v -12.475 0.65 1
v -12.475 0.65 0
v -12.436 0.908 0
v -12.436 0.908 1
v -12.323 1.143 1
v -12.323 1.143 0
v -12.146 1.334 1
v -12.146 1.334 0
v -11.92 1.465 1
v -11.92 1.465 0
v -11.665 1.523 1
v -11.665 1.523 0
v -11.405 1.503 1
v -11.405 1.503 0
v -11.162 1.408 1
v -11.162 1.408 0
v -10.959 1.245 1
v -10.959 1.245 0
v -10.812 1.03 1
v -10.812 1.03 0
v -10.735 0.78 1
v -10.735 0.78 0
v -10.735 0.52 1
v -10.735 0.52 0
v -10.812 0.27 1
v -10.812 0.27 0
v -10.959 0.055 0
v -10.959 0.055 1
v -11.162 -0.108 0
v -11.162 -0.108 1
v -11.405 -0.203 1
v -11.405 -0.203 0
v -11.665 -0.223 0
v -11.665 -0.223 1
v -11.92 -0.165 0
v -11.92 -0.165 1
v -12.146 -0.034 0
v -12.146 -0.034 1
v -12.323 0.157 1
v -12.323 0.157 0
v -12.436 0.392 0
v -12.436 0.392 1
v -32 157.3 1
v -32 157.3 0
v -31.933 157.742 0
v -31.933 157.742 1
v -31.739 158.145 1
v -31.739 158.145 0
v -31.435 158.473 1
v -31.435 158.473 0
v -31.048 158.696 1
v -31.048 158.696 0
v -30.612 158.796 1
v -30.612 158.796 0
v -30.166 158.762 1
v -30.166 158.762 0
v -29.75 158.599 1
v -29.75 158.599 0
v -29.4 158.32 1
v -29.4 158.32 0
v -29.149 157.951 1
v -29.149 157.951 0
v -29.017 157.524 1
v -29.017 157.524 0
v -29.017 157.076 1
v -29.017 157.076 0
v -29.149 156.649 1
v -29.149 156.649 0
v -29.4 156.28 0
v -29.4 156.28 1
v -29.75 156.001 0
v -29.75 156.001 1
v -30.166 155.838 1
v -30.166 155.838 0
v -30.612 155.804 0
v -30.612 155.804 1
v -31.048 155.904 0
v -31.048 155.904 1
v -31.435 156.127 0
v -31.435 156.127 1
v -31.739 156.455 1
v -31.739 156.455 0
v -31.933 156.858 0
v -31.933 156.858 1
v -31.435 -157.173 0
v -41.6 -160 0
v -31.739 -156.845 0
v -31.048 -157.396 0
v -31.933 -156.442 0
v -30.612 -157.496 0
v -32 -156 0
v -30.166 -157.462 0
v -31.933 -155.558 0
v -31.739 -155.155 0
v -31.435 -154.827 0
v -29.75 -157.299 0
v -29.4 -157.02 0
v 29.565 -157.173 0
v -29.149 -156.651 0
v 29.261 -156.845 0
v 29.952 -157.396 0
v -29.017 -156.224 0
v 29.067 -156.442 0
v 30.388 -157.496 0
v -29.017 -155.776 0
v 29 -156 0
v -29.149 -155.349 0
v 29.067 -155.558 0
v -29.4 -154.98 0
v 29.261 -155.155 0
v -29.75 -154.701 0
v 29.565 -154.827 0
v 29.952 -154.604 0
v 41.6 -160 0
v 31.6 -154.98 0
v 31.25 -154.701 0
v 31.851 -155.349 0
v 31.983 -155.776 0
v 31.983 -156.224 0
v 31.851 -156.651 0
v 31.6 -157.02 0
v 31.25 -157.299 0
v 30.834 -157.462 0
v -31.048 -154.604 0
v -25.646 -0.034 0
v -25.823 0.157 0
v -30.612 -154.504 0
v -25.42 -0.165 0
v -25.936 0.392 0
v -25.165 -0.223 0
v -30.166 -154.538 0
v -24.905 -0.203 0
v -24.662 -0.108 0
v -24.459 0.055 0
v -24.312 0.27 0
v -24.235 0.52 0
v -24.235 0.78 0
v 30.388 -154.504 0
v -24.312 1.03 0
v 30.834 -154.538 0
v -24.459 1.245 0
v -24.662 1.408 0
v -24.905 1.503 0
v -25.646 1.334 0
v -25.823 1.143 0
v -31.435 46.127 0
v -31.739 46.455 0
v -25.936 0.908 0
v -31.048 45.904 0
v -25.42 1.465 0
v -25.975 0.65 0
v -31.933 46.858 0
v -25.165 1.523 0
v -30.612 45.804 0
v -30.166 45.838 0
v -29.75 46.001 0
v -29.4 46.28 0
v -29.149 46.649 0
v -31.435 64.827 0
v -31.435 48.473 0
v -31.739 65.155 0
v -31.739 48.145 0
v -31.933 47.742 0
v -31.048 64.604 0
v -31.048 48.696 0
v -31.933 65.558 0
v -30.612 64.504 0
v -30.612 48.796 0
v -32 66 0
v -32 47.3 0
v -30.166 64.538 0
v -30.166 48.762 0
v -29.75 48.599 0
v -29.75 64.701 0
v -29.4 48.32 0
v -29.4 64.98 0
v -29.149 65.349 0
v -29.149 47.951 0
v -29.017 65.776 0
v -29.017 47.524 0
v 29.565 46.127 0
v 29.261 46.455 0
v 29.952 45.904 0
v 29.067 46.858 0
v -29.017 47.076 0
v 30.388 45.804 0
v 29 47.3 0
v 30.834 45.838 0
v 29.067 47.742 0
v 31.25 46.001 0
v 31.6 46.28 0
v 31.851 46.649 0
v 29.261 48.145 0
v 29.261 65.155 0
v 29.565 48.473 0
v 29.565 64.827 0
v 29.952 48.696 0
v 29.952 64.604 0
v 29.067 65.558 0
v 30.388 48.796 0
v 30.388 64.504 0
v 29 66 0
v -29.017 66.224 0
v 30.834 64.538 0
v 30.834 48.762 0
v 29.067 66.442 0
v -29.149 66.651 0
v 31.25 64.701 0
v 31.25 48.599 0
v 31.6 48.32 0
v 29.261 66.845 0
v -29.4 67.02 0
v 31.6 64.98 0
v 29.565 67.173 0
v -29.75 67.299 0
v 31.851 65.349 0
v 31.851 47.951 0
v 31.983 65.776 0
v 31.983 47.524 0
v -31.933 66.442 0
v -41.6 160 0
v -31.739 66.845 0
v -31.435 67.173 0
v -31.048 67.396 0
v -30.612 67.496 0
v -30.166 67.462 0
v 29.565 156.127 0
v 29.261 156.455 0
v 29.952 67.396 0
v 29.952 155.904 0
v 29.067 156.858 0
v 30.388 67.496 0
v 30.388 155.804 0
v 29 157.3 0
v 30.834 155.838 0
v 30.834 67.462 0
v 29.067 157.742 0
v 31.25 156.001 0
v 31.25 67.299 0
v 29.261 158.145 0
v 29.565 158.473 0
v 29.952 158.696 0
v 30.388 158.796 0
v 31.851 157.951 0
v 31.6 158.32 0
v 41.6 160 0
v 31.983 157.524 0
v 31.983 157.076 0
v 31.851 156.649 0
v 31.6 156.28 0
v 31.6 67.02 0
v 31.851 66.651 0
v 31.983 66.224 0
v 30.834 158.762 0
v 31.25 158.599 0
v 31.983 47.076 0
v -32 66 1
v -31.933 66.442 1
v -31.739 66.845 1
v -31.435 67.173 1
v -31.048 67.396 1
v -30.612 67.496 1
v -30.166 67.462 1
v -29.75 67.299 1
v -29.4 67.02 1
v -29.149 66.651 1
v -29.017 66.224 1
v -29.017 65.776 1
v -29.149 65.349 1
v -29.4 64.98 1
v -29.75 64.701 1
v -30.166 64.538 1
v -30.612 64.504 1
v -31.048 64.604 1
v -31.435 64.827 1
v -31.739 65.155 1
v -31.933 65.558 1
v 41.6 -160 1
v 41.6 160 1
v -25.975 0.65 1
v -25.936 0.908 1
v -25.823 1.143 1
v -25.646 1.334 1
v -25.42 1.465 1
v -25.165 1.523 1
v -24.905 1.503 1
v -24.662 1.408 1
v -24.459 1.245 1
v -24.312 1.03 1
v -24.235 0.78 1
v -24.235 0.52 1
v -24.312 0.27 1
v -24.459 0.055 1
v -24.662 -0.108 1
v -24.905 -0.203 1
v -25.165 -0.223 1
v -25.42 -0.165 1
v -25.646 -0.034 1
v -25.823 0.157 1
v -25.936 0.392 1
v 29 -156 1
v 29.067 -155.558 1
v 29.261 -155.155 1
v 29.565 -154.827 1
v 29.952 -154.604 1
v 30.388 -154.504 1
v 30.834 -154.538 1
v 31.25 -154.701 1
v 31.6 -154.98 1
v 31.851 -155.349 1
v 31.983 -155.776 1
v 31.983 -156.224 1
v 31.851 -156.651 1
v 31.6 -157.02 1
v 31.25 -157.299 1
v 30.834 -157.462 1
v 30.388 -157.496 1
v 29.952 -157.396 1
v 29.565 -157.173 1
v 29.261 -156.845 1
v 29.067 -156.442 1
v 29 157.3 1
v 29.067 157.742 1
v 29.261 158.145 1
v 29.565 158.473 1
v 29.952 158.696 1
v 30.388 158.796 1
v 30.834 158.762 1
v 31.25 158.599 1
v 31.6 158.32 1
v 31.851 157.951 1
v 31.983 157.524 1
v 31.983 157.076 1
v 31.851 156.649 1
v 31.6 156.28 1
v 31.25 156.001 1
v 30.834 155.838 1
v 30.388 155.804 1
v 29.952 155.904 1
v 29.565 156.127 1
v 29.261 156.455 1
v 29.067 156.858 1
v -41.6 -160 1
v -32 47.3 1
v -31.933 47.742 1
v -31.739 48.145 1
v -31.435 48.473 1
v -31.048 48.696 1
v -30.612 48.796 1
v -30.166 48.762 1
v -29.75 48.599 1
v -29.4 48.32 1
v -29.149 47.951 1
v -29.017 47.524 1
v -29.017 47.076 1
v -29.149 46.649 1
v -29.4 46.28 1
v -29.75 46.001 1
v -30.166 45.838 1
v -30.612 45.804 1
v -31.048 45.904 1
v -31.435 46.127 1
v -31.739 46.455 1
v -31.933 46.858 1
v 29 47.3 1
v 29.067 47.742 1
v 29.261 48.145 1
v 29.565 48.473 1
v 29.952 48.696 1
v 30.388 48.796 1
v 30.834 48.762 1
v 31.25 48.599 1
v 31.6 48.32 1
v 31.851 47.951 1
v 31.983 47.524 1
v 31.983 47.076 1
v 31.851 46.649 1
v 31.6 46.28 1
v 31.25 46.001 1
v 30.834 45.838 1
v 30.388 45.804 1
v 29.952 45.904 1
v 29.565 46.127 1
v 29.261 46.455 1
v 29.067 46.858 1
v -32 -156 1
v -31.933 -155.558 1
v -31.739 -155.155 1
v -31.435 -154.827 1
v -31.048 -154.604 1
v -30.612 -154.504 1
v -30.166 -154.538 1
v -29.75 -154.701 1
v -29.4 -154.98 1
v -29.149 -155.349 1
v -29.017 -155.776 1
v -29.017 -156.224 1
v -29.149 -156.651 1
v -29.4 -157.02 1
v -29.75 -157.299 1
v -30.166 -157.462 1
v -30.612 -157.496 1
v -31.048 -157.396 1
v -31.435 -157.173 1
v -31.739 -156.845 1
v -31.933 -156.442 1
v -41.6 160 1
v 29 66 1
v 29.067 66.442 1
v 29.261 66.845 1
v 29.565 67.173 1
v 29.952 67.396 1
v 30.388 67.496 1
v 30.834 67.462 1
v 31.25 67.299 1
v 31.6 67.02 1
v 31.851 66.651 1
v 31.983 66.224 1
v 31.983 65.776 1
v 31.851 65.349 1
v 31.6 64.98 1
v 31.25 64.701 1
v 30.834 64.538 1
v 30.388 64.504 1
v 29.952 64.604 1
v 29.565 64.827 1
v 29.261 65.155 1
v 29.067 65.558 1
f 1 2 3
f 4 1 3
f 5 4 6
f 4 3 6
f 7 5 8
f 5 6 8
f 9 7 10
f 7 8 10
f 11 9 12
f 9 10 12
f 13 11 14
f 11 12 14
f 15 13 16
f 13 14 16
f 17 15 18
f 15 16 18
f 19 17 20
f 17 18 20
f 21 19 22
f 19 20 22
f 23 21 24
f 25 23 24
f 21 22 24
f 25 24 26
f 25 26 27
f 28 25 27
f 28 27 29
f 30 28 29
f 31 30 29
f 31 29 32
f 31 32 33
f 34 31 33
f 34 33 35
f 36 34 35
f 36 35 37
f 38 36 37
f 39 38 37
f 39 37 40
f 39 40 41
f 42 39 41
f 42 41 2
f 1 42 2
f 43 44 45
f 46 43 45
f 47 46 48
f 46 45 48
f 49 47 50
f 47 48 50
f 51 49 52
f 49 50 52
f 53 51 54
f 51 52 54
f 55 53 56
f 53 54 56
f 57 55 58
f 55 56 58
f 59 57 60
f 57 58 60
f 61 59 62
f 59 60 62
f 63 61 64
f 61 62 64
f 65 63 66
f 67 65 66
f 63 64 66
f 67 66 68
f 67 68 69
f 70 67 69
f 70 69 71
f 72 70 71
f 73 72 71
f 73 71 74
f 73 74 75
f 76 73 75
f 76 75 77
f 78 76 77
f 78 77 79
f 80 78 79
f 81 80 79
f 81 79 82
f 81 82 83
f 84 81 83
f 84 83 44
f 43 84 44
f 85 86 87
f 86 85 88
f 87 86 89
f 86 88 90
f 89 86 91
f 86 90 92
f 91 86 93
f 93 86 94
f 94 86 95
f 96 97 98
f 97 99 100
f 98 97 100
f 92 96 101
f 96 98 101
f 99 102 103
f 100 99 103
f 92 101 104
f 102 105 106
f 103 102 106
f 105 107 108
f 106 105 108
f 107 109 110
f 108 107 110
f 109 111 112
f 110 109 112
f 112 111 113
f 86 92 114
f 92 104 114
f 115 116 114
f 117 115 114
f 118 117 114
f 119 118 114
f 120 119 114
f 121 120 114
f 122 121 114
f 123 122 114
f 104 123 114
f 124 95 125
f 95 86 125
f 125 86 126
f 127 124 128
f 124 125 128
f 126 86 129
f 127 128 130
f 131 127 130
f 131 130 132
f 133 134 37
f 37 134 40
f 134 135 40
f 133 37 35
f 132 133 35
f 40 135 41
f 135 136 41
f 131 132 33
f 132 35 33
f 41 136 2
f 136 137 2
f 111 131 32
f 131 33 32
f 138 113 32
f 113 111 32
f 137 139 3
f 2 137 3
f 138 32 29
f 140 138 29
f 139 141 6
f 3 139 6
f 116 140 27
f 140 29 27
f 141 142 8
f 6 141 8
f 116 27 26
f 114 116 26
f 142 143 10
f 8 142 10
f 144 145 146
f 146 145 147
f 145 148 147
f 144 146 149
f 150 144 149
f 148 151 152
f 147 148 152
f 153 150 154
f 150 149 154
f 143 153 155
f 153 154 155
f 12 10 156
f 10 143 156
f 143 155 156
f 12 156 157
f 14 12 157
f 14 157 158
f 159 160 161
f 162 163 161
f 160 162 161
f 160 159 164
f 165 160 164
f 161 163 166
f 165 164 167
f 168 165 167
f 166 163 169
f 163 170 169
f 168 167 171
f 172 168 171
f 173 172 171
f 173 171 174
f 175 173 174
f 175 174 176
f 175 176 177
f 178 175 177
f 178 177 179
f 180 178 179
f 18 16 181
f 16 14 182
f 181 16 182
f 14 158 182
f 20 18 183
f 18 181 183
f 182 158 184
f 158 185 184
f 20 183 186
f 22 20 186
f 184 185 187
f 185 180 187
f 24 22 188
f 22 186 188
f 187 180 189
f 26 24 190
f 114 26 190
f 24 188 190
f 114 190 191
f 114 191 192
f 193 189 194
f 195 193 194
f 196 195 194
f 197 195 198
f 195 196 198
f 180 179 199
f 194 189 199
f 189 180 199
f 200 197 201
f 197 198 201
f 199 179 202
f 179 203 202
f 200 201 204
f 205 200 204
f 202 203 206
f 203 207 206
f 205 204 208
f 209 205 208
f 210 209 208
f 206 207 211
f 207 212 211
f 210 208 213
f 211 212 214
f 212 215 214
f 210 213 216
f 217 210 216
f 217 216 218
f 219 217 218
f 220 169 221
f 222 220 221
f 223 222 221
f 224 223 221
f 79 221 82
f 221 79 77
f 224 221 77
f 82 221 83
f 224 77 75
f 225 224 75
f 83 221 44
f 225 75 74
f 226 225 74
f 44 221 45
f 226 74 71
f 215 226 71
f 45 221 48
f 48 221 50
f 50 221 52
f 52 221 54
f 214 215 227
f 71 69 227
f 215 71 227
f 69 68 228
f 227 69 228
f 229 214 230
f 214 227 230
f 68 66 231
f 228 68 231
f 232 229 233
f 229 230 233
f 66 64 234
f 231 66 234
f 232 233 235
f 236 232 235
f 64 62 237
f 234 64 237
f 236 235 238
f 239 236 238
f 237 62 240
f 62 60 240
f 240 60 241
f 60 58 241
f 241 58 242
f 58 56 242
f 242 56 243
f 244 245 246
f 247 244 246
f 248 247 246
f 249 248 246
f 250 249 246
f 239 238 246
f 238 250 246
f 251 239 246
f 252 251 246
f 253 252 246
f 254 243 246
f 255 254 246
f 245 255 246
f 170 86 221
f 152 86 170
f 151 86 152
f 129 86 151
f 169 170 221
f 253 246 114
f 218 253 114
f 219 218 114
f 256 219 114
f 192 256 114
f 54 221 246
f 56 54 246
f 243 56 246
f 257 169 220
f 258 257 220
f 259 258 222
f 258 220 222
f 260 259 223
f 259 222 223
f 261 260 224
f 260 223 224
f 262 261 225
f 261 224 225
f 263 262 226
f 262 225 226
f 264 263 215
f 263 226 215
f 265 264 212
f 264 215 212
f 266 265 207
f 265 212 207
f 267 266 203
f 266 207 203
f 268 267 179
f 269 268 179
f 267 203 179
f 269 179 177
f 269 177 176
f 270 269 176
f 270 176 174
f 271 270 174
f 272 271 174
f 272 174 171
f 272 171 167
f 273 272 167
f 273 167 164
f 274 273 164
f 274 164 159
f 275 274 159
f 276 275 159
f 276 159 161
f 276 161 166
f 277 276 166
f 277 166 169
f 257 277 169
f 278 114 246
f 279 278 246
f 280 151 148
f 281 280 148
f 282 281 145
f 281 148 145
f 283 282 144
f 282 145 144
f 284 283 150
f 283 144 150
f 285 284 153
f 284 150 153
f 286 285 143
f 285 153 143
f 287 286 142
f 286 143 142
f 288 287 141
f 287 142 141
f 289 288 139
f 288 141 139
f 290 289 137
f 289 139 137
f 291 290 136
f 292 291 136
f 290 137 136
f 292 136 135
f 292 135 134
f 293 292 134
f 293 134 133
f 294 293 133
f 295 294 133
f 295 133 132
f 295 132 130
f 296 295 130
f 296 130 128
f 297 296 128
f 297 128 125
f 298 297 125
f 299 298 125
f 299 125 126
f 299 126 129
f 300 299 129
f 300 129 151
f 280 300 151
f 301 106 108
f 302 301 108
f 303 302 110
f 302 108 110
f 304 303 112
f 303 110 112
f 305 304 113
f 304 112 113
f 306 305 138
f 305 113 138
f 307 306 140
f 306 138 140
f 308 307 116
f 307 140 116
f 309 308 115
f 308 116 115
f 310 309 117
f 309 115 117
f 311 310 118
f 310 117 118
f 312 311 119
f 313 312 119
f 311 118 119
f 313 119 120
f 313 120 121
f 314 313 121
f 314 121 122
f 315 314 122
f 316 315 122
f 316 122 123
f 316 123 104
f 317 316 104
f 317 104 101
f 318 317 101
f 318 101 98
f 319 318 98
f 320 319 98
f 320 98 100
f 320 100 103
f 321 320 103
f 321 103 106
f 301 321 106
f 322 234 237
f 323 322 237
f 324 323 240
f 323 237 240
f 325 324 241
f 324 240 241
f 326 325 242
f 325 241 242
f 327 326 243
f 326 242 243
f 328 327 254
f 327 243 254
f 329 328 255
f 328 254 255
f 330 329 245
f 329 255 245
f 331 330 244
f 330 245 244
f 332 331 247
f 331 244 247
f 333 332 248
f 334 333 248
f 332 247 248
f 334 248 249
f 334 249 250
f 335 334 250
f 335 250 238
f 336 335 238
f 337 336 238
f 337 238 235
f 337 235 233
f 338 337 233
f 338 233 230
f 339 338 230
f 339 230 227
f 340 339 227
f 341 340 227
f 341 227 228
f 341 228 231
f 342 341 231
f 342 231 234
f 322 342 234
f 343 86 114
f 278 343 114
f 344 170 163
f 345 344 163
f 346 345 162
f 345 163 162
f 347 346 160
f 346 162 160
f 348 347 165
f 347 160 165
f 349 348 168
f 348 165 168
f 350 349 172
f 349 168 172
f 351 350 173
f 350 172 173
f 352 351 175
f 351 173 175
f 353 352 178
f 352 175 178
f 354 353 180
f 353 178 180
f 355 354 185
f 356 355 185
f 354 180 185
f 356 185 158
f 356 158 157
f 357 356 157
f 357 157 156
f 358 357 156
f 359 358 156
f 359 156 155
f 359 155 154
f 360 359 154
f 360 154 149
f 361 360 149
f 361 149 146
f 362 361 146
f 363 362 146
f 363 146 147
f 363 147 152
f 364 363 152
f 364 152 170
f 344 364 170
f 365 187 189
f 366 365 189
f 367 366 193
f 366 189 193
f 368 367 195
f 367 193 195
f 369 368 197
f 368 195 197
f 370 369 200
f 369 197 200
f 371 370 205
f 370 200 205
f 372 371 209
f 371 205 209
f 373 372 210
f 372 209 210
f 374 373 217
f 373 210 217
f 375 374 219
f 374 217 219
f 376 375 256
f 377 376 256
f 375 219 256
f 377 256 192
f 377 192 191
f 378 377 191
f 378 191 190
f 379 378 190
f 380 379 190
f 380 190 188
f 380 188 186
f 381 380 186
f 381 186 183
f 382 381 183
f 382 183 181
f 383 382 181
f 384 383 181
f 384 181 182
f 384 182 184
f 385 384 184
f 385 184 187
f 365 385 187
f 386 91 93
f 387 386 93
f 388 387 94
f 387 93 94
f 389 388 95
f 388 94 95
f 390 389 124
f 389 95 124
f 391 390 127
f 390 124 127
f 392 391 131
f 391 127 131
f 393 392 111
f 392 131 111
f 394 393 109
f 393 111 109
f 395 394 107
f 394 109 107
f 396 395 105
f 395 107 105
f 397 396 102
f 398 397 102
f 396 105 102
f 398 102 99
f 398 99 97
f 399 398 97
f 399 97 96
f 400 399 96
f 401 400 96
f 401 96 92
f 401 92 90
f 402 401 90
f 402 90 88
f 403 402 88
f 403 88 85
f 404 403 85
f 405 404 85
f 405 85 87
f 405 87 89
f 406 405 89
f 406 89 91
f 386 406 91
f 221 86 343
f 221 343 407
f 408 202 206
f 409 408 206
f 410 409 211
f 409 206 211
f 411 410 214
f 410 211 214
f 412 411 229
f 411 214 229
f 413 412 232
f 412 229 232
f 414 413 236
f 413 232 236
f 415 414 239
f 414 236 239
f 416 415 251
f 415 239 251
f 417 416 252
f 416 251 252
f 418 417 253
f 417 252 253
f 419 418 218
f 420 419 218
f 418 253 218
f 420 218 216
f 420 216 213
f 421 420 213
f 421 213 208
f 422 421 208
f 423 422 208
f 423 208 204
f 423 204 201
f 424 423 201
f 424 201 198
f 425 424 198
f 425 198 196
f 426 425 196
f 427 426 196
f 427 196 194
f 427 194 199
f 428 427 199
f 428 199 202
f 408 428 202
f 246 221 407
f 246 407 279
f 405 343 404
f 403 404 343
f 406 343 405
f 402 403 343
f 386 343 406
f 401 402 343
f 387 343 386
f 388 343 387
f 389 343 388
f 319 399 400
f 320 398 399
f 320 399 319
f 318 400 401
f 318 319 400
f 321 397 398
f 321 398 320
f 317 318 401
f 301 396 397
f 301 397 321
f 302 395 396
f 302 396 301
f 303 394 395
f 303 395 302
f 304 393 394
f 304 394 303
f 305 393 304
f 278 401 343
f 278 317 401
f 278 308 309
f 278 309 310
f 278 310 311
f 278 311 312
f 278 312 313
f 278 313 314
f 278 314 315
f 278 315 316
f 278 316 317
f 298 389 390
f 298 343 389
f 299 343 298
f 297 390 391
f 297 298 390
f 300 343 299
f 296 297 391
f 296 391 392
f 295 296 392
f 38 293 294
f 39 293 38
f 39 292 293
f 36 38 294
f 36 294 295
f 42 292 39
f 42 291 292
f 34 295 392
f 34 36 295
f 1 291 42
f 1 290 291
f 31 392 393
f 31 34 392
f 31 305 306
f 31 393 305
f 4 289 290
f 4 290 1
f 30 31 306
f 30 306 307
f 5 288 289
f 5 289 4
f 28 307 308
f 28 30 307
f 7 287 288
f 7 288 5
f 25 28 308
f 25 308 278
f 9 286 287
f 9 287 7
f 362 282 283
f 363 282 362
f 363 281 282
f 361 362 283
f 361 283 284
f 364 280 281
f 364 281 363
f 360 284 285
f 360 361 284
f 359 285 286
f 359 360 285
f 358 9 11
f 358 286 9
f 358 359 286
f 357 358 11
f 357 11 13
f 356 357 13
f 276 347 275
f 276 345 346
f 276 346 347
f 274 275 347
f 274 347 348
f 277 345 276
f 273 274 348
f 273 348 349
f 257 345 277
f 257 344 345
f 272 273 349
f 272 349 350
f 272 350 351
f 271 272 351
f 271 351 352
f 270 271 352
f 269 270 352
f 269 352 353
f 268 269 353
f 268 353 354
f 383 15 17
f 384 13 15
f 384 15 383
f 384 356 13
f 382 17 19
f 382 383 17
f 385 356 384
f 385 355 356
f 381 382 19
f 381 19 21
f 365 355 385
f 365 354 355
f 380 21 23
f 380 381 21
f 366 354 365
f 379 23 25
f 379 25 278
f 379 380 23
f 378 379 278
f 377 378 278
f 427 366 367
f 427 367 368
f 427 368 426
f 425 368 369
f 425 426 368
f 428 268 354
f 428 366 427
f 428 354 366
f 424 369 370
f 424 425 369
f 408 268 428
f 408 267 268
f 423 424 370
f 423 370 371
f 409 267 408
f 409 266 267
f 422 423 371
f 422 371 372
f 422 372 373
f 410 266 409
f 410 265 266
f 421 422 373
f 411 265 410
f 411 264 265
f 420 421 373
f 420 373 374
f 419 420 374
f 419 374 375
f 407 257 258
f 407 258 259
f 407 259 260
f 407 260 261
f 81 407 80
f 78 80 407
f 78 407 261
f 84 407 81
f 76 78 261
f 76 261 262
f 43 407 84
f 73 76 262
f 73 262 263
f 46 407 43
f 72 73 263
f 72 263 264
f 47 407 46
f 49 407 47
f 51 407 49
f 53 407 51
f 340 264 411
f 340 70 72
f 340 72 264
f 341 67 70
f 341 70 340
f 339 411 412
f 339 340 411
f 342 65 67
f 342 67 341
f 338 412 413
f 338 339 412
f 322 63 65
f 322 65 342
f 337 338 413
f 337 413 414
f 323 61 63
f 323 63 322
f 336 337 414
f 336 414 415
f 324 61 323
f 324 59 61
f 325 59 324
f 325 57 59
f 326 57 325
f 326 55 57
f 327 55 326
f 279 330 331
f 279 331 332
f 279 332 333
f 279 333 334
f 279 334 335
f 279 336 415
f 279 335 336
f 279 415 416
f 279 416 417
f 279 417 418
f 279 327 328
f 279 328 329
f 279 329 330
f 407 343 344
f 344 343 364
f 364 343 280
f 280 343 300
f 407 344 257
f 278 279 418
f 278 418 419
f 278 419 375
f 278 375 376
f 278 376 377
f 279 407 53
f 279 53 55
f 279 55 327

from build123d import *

# Parameters (mm, degrees)
SKETCH1_W                    = 83.2
SKETCH1_H                    = 320
BOSS_EXTRUDE1_DEPTH          = 1
F_3_0_3_DIAMETER_HOLE1_D     = 3
F_1_75_1_75_DIAMETER_HOLE1_D = 1.75


with BuildPart() as part:
    # Sketch1 → Boss-Extrude1 (new body)
    with BuildSketch(Plane.XY):
        Rectangle(SKETCH1_W, SKETCH1_H)
    extrude(amount=BOSS_EXTRUDE1_DEPTH)

    # Ø3.0 (3) Diameter Hole1 (through all)
    with Locations(Plane.XY.offset(1)):
        with Locations((-30.5, 66), (30.5, 66), (30.5, -156), (-30.5, -156), (-30.5, 157.3), (30.5, 157.3), (-30.5, 47.3), (30.5, 47.3)):
            Hole(F_3_0_3_DIAMETER_HOLE1_D / 2)

    # Ø1.75 (1.75) Diameter Hole1 (through all)
    with Locations(Plane.XY.offset(1)):
        with Locations((-25.099975914, 0.65), (-11.599975914, 0.65)):
            Hole(F_1_75_1_75_DIAMETER_HOLE1_D / 2)


solid = part.part
